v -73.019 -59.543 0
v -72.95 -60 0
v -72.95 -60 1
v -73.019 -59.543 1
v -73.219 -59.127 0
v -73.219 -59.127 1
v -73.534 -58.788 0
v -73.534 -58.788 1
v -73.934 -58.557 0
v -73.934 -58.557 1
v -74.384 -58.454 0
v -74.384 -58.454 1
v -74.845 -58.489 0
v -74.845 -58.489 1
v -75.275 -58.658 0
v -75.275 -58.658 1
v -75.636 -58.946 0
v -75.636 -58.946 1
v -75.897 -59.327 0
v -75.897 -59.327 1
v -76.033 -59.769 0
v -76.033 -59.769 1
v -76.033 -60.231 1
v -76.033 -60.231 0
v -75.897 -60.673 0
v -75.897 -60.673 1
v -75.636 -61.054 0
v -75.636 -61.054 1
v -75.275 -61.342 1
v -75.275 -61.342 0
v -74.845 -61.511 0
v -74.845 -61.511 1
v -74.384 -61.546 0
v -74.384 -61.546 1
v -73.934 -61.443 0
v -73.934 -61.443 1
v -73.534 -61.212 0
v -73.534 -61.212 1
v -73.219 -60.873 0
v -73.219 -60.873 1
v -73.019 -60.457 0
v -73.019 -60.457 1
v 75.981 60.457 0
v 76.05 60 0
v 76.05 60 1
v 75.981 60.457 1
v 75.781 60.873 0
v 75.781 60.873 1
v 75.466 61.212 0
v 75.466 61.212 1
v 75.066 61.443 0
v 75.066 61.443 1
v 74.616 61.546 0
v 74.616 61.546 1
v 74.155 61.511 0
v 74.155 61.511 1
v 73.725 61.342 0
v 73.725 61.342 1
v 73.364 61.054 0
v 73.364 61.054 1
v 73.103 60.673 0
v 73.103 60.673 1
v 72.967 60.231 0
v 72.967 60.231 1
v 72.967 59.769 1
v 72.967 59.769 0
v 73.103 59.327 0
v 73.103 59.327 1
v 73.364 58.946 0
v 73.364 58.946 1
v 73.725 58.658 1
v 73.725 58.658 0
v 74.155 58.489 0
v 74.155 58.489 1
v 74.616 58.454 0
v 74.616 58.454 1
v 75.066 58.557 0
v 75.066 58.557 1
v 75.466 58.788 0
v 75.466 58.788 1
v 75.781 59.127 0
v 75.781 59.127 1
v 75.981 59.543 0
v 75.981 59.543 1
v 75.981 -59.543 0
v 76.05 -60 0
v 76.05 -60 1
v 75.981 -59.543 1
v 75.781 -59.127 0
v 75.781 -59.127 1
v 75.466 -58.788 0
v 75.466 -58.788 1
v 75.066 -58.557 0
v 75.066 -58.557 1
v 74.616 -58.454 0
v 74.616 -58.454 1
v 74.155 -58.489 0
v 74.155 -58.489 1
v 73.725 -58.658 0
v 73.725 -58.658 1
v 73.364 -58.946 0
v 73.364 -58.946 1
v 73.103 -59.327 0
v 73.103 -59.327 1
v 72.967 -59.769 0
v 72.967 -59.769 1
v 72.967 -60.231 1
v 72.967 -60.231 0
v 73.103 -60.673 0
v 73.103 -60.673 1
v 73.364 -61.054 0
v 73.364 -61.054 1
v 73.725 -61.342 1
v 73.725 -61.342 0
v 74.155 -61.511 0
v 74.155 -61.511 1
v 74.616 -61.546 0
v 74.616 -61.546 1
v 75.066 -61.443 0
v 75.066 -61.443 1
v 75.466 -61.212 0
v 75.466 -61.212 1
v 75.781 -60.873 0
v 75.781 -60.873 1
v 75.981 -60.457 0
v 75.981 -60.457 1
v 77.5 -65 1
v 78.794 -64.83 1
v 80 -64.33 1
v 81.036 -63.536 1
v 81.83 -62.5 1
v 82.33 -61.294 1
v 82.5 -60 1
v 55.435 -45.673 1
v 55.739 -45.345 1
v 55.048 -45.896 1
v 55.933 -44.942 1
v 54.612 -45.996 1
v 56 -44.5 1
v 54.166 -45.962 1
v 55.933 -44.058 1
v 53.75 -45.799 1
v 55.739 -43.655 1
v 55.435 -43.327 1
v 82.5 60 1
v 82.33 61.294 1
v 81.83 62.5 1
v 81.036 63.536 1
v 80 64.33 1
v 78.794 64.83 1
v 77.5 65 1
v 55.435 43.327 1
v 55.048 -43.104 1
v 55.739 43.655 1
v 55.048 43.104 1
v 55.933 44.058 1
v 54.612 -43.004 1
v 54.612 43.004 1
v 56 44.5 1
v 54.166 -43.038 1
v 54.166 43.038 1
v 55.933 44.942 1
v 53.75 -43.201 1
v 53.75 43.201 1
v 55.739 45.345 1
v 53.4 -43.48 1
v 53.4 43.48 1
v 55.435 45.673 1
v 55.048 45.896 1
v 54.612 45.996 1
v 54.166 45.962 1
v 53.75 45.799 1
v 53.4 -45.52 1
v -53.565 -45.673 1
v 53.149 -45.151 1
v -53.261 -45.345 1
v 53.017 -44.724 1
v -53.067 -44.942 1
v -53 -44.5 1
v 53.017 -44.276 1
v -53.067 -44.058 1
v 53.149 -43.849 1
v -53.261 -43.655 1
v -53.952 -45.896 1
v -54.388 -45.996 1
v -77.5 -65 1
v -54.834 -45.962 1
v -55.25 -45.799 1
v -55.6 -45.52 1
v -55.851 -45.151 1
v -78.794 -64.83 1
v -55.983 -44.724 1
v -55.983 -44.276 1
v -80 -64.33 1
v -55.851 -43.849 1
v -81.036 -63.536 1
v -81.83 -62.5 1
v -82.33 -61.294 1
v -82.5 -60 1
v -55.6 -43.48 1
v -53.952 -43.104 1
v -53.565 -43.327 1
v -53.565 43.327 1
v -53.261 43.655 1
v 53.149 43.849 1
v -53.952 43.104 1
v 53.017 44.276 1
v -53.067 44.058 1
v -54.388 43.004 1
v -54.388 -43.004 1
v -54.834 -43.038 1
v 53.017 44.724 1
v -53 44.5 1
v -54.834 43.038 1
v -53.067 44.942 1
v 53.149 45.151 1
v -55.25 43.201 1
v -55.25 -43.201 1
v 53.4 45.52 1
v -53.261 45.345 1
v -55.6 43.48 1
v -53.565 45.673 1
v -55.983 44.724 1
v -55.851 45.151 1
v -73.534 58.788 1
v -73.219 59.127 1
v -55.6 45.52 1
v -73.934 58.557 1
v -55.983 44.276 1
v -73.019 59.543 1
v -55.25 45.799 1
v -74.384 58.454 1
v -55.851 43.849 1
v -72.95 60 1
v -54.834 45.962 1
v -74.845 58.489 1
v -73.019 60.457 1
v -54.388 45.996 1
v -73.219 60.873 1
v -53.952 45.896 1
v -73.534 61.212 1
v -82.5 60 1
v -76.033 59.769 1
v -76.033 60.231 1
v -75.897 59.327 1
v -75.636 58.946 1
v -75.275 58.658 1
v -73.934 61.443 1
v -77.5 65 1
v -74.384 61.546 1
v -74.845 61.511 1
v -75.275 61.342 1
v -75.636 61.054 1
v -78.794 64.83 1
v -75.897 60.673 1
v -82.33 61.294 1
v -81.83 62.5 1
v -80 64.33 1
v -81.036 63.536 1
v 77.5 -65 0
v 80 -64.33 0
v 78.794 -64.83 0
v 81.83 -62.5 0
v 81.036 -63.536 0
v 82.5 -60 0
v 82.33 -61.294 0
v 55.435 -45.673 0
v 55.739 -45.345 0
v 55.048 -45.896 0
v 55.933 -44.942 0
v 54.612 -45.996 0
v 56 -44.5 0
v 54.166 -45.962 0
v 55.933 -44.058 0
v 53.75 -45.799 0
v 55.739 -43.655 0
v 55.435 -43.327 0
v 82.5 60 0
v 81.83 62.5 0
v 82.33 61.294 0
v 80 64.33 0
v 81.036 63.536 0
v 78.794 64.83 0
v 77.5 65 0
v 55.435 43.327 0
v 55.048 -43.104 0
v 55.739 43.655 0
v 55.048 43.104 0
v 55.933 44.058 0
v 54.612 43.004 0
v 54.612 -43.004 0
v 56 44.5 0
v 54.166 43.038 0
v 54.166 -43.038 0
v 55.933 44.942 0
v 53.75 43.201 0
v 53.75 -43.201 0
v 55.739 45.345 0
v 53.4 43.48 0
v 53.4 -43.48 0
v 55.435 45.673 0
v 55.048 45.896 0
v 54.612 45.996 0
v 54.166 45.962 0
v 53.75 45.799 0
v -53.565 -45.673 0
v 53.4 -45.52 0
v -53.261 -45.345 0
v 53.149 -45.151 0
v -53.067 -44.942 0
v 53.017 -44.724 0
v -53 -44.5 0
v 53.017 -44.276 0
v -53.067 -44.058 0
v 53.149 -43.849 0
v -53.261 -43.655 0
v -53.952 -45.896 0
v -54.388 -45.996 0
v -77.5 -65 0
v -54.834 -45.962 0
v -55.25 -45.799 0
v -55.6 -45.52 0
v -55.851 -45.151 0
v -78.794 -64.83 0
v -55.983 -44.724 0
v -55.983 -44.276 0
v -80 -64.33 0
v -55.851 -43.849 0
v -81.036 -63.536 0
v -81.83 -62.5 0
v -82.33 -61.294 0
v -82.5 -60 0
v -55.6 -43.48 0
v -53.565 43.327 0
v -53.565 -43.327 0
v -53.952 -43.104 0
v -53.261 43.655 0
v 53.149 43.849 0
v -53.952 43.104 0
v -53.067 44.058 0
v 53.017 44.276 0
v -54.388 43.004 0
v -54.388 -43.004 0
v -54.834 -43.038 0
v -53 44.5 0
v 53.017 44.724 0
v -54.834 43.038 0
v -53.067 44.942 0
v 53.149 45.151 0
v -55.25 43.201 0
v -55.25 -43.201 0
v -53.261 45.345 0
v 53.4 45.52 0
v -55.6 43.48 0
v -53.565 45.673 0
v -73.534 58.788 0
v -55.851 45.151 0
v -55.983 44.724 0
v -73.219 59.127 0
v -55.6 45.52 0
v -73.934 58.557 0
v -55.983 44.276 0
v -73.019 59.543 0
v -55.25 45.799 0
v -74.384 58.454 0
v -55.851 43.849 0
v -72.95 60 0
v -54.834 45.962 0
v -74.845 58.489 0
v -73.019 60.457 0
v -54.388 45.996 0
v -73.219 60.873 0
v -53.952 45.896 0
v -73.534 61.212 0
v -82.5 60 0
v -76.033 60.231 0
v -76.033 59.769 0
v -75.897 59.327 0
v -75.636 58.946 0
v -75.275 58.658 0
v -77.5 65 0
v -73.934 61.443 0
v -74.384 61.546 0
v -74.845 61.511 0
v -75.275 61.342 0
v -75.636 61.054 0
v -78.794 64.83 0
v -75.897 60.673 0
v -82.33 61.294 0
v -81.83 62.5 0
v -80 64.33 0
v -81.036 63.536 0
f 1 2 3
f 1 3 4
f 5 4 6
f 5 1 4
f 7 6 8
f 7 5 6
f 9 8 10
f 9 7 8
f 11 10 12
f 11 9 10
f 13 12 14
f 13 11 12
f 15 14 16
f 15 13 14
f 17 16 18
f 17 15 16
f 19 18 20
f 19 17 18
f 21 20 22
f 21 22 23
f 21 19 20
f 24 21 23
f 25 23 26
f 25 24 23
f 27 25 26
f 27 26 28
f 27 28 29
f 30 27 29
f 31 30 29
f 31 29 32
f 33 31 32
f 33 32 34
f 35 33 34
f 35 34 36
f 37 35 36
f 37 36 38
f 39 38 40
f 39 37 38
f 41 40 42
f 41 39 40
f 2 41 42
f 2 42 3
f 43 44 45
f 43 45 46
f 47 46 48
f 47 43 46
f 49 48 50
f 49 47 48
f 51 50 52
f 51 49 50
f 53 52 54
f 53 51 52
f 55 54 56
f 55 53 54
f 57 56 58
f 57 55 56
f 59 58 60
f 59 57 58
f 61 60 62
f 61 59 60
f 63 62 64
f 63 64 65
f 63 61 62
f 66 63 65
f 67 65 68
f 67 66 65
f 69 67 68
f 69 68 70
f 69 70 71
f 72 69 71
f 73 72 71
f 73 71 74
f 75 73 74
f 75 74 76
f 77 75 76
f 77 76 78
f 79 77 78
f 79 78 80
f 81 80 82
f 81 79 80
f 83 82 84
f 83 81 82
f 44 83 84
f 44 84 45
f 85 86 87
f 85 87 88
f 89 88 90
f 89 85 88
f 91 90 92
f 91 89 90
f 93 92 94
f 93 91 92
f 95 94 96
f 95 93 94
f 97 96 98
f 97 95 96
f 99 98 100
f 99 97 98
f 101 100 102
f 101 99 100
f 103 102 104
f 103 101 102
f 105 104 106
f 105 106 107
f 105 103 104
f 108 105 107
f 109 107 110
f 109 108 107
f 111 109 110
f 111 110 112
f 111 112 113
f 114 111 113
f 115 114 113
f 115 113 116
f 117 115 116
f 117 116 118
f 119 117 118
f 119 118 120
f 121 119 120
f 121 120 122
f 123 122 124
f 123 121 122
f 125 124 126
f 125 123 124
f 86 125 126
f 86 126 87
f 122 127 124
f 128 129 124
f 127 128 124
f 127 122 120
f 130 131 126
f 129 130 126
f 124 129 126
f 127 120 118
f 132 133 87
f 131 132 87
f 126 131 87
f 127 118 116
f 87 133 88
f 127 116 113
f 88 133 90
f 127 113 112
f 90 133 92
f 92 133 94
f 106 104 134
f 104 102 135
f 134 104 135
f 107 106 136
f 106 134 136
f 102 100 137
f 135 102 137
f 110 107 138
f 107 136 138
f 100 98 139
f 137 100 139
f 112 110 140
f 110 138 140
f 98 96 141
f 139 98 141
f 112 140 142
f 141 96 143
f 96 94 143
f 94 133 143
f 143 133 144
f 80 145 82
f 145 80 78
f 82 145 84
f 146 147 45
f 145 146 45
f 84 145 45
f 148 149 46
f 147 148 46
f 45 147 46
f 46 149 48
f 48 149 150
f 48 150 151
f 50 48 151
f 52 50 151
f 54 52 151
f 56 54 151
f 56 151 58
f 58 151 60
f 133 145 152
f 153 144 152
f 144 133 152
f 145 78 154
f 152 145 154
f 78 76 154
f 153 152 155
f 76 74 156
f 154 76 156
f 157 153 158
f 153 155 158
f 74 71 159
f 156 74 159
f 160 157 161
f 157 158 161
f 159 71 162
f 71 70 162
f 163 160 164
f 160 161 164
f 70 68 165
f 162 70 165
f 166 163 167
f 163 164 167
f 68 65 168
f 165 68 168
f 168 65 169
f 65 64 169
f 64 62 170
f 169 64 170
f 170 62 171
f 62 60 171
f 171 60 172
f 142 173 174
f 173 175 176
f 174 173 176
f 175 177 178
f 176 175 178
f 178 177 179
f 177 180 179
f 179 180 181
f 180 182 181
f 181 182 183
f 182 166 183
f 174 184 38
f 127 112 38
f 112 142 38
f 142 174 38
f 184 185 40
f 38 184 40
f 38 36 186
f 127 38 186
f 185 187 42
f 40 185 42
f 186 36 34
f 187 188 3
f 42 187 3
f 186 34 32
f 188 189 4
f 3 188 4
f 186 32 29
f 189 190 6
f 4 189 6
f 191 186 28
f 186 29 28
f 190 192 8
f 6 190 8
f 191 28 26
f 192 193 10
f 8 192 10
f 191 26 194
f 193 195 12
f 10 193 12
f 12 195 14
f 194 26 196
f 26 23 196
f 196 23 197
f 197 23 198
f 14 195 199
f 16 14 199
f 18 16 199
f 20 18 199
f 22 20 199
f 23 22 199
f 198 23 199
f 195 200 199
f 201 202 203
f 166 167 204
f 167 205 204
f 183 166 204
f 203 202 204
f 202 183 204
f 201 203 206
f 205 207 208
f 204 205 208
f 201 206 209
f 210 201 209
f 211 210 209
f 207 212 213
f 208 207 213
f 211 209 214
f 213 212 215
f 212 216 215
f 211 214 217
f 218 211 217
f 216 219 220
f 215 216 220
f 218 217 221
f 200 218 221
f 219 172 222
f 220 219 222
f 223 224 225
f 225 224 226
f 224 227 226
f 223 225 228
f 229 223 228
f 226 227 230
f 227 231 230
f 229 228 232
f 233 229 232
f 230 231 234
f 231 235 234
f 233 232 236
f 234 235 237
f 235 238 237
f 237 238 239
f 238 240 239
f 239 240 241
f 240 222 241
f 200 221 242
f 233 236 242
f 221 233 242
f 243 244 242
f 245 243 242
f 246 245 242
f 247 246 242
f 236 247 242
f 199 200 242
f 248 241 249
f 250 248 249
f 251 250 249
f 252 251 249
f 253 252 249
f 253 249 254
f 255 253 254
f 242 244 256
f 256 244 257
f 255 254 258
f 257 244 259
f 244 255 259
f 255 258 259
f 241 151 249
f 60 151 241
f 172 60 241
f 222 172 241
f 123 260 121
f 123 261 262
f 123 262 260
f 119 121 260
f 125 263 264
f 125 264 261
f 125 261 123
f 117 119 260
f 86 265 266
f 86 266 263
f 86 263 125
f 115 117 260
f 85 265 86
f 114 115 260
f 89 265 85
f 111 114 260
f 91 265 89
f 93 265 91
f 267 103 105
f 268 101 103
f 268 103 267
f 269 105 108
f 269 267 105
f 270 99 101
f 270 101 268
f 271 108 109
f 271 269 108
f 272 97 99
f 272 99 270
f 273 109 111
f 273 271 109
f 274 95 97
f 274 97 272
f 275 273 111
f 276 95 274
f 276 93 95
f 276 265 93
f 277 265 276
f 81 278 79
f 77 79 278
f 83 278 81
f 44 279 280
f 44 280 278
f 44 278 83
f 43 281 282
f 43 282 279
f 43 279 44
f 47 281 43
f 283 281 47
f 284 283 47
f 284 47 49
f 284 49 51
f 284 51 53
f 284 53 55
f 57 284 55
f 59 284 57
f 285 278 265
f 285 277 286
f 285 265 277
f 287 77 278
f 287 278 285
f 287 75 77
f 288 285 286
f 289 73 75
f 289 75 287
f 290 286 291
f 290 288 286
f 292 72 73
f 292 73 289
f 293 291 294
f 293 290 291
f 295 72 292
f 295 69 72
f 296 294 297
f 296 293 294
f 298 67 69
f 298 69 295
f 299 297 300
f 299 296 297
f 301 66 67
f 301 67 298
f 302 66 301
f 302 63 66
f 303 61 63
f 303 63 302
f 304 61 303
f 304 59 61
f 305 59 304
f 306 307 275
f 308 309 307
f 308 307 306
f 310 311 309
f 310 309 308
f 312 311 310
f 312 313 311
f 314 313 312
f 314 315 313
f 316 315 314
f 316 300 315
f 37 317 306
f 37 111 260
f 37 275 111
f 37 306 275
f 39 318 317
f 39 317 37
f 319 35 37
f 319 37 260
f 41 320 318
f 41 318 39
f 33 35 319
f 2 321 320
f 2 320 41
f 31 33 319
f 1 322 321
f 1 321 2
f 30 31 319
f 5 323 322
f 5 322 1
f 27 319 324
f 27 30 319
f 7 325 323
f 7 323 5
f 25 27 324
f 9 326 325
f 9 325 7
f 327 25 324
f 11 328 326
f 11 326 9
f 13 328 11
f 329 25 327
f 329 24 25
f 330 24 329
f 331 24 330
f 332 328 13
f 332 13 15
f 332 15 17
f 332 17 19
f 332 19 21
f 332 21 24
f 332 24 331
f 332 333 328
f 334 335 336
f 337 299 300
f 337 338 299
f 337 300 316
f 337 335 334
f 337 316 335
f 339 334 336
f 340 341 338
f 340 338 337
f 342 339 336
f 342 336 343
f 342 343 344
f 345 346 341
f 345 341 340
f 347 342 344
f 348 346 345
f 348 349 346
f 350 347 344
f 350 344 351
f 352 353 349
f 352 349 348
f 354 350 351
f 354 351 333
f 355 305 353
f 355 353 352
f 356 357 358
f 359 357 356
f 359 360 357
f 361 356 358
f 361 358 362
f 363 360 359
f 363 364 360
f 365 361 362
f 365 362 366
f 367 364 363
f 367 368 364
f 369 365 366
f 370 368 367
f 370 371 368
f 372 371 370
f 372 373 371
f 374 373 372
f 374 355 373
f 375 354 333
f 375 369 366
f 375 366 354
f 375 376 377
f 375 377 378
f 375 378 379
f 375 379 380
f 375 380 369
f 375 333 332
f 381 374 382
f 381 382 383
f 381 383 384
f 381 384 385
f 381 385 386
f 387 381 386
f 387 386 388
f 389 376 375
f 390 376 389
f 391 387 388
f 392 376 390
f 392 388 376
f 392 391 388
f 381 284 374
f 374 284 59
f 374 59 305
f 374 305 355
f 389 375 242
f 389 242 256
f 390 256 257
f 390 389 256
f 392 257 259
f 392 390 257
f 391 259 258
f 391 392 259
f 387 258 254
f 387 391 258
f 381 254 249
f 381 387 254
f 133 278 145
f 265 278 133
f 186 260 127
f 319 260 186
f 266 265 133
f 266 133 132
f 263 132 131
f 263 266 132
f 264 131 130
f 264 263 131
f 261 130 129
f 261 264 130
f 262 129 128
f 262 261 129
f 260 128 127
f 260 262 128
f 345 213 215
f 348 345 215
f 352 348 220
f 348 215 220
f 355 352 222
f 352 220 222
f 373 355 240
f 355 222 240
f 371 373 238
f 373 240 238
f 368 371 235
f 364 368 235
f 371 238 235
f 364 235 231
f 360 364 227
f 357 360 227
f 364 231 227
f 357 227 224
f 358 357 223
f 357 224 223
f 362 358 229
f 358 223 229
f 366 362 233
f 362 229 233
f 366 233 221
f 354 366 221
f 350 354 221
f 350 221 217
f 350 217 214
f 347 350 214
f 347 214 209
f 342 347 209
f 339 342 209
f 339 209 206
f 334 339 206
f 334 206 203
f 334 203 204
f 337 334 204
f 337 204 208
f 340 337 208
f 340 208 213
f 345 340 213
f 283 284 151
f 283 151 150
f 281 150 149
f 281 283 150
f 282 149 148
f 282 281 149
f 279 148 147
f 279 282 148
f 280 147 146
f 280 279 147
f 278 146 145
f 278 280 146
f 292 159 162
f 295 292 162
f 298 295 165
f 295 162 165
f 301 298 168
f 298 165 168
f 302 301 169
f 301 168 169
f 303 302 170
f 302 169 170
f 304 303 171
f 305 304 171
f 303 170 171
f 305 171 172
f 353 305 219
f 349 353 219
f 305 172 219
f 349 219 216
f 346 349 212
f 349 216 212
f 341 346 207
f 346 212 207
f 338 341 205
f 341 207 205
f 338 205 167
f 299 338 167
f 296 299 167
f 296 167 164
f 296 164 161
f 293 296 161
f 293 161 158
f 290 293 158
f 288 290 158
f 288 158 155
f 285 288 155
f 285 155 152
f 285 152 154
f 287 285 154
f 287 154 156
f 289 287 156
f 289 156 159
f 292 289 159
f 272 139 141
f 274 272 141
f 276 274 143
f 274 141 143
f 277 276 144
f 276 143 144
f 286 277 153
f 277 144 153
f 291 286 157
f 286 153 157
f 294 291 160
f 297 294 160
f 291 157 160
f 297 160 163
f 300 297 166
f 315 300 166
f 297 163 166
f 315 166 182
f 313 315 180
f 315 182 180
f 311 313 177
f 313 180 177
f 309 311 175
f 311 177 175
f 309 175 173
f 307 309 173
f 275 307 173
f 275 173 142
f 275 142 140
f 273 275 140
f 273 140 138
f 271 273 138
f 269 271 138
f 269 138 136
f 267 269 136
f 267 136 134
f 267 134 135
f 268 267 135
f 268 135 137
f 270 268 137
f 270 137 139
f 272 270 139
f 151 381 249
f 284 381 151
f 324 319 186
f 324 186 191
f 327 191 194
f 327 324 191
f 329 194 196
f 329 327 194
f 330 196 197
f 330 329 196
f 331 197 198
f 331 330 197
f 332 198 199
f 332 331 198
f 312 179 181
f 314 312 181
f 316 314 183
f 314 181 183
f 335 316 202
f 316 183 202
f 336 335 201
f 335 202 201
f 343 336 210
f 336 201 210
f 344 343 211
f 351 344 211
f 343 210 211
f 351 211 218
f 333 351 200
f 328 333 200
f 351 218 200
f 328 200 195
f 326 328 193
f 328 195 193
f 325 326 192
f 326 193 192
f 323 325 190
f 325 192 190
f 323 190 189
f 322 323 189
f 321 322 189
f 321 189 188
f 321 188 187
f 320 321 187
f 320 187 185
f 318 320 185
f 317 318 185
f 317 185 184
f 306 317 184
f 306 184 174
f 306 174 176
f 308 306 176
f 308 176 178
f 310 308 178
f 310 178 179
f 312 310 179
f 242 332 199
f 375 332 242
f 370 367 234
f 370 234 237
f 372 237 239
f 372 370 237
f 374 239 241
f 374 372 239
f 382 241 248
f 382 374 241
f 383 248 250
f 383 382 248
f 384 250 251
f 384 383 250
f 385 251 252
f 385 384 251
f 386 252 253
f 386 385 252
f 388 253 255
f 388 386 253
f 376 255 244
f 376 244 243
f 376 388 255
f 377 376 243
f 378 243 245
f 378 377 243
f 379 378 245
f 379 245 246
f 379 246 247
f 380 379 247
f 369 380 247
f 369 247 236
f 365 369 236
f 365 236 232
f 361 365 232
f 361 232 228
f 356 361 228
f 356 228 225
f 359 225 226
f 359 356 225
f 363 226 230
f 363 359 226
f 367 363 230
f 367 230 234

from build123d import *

# Parameters (mm, degrees)
SKETCH_1_R          = 1.55
EXTRUDE_1_DEPTH     = 1
SKETCH_2_R          = 1.5
CUT_EXTRUDE_1_DEPTH = 10


with BuildPart() as part:
    # 草图1 → 凸台-拉伸1 (new body)
    with BuildSketch(Plane.XY):
        with BuildLine():
            Line((-77.5, 65), (77.5, 65))
            ThreePointArc((77.5, 65), (81.035533906, 63.535533906), (82.5, 60))
            Line((82.5, 60), (82.5, -60))
            ThreePointArc((82.5, -60), (81.035533906, -63.535533906), (77.5, -65))
            Line((77.5, -65), (-77.5, -65))
            ThreePointArc((-77.5, -65), (-81.035533906, -63.535533906), (-82.5, -60))
            Line((-82.5, -60), (-82.5, 60))
            ThreePointArc((-82.5, 60), (-81.035533906, 63.535533906), (-77.5, 65))
        make_face()
        with Locations((-74.5, 60)):
            Circle(SKETCH_1_R, mode=Mode.SUBTRACT)
        with Locations((74.5, 60)):
            Circle(SKETCH_1_R, mode=Mode.SUBTRACT)
        with Locations((74.5, -60)):
            Circle(SKETCH_1_R, mode=Mode.SUBTRACT)
        with Locations((-74.5, -60)):
            Circle(SKETCH_1_R, mode=Mode.SUBTRACT)
    extrude(amount=EXTRUDE_1_DEPTH)

    # 草图2 → 切除-拉伸1 (cut)
    with BuildSketch(Plane.XY.offset(1)):
        with Locations((-54.5, 44.5)):
            Circle(SKETCH_2_R)
        with Locations((-54.5, -44.5)):
            Circle(SKETCH_2_R)
        with Locations((54.5, -44.5)):
            Circle(SKETCH_2_R)
        with Locations((54.5, 44.5)):
            Circle(SKETCH_2_R)
    extrude(amount=-CUT_EXTRUDE_1_DEPTH, mode=Mode.SUBTRACT)


solid = part.part
